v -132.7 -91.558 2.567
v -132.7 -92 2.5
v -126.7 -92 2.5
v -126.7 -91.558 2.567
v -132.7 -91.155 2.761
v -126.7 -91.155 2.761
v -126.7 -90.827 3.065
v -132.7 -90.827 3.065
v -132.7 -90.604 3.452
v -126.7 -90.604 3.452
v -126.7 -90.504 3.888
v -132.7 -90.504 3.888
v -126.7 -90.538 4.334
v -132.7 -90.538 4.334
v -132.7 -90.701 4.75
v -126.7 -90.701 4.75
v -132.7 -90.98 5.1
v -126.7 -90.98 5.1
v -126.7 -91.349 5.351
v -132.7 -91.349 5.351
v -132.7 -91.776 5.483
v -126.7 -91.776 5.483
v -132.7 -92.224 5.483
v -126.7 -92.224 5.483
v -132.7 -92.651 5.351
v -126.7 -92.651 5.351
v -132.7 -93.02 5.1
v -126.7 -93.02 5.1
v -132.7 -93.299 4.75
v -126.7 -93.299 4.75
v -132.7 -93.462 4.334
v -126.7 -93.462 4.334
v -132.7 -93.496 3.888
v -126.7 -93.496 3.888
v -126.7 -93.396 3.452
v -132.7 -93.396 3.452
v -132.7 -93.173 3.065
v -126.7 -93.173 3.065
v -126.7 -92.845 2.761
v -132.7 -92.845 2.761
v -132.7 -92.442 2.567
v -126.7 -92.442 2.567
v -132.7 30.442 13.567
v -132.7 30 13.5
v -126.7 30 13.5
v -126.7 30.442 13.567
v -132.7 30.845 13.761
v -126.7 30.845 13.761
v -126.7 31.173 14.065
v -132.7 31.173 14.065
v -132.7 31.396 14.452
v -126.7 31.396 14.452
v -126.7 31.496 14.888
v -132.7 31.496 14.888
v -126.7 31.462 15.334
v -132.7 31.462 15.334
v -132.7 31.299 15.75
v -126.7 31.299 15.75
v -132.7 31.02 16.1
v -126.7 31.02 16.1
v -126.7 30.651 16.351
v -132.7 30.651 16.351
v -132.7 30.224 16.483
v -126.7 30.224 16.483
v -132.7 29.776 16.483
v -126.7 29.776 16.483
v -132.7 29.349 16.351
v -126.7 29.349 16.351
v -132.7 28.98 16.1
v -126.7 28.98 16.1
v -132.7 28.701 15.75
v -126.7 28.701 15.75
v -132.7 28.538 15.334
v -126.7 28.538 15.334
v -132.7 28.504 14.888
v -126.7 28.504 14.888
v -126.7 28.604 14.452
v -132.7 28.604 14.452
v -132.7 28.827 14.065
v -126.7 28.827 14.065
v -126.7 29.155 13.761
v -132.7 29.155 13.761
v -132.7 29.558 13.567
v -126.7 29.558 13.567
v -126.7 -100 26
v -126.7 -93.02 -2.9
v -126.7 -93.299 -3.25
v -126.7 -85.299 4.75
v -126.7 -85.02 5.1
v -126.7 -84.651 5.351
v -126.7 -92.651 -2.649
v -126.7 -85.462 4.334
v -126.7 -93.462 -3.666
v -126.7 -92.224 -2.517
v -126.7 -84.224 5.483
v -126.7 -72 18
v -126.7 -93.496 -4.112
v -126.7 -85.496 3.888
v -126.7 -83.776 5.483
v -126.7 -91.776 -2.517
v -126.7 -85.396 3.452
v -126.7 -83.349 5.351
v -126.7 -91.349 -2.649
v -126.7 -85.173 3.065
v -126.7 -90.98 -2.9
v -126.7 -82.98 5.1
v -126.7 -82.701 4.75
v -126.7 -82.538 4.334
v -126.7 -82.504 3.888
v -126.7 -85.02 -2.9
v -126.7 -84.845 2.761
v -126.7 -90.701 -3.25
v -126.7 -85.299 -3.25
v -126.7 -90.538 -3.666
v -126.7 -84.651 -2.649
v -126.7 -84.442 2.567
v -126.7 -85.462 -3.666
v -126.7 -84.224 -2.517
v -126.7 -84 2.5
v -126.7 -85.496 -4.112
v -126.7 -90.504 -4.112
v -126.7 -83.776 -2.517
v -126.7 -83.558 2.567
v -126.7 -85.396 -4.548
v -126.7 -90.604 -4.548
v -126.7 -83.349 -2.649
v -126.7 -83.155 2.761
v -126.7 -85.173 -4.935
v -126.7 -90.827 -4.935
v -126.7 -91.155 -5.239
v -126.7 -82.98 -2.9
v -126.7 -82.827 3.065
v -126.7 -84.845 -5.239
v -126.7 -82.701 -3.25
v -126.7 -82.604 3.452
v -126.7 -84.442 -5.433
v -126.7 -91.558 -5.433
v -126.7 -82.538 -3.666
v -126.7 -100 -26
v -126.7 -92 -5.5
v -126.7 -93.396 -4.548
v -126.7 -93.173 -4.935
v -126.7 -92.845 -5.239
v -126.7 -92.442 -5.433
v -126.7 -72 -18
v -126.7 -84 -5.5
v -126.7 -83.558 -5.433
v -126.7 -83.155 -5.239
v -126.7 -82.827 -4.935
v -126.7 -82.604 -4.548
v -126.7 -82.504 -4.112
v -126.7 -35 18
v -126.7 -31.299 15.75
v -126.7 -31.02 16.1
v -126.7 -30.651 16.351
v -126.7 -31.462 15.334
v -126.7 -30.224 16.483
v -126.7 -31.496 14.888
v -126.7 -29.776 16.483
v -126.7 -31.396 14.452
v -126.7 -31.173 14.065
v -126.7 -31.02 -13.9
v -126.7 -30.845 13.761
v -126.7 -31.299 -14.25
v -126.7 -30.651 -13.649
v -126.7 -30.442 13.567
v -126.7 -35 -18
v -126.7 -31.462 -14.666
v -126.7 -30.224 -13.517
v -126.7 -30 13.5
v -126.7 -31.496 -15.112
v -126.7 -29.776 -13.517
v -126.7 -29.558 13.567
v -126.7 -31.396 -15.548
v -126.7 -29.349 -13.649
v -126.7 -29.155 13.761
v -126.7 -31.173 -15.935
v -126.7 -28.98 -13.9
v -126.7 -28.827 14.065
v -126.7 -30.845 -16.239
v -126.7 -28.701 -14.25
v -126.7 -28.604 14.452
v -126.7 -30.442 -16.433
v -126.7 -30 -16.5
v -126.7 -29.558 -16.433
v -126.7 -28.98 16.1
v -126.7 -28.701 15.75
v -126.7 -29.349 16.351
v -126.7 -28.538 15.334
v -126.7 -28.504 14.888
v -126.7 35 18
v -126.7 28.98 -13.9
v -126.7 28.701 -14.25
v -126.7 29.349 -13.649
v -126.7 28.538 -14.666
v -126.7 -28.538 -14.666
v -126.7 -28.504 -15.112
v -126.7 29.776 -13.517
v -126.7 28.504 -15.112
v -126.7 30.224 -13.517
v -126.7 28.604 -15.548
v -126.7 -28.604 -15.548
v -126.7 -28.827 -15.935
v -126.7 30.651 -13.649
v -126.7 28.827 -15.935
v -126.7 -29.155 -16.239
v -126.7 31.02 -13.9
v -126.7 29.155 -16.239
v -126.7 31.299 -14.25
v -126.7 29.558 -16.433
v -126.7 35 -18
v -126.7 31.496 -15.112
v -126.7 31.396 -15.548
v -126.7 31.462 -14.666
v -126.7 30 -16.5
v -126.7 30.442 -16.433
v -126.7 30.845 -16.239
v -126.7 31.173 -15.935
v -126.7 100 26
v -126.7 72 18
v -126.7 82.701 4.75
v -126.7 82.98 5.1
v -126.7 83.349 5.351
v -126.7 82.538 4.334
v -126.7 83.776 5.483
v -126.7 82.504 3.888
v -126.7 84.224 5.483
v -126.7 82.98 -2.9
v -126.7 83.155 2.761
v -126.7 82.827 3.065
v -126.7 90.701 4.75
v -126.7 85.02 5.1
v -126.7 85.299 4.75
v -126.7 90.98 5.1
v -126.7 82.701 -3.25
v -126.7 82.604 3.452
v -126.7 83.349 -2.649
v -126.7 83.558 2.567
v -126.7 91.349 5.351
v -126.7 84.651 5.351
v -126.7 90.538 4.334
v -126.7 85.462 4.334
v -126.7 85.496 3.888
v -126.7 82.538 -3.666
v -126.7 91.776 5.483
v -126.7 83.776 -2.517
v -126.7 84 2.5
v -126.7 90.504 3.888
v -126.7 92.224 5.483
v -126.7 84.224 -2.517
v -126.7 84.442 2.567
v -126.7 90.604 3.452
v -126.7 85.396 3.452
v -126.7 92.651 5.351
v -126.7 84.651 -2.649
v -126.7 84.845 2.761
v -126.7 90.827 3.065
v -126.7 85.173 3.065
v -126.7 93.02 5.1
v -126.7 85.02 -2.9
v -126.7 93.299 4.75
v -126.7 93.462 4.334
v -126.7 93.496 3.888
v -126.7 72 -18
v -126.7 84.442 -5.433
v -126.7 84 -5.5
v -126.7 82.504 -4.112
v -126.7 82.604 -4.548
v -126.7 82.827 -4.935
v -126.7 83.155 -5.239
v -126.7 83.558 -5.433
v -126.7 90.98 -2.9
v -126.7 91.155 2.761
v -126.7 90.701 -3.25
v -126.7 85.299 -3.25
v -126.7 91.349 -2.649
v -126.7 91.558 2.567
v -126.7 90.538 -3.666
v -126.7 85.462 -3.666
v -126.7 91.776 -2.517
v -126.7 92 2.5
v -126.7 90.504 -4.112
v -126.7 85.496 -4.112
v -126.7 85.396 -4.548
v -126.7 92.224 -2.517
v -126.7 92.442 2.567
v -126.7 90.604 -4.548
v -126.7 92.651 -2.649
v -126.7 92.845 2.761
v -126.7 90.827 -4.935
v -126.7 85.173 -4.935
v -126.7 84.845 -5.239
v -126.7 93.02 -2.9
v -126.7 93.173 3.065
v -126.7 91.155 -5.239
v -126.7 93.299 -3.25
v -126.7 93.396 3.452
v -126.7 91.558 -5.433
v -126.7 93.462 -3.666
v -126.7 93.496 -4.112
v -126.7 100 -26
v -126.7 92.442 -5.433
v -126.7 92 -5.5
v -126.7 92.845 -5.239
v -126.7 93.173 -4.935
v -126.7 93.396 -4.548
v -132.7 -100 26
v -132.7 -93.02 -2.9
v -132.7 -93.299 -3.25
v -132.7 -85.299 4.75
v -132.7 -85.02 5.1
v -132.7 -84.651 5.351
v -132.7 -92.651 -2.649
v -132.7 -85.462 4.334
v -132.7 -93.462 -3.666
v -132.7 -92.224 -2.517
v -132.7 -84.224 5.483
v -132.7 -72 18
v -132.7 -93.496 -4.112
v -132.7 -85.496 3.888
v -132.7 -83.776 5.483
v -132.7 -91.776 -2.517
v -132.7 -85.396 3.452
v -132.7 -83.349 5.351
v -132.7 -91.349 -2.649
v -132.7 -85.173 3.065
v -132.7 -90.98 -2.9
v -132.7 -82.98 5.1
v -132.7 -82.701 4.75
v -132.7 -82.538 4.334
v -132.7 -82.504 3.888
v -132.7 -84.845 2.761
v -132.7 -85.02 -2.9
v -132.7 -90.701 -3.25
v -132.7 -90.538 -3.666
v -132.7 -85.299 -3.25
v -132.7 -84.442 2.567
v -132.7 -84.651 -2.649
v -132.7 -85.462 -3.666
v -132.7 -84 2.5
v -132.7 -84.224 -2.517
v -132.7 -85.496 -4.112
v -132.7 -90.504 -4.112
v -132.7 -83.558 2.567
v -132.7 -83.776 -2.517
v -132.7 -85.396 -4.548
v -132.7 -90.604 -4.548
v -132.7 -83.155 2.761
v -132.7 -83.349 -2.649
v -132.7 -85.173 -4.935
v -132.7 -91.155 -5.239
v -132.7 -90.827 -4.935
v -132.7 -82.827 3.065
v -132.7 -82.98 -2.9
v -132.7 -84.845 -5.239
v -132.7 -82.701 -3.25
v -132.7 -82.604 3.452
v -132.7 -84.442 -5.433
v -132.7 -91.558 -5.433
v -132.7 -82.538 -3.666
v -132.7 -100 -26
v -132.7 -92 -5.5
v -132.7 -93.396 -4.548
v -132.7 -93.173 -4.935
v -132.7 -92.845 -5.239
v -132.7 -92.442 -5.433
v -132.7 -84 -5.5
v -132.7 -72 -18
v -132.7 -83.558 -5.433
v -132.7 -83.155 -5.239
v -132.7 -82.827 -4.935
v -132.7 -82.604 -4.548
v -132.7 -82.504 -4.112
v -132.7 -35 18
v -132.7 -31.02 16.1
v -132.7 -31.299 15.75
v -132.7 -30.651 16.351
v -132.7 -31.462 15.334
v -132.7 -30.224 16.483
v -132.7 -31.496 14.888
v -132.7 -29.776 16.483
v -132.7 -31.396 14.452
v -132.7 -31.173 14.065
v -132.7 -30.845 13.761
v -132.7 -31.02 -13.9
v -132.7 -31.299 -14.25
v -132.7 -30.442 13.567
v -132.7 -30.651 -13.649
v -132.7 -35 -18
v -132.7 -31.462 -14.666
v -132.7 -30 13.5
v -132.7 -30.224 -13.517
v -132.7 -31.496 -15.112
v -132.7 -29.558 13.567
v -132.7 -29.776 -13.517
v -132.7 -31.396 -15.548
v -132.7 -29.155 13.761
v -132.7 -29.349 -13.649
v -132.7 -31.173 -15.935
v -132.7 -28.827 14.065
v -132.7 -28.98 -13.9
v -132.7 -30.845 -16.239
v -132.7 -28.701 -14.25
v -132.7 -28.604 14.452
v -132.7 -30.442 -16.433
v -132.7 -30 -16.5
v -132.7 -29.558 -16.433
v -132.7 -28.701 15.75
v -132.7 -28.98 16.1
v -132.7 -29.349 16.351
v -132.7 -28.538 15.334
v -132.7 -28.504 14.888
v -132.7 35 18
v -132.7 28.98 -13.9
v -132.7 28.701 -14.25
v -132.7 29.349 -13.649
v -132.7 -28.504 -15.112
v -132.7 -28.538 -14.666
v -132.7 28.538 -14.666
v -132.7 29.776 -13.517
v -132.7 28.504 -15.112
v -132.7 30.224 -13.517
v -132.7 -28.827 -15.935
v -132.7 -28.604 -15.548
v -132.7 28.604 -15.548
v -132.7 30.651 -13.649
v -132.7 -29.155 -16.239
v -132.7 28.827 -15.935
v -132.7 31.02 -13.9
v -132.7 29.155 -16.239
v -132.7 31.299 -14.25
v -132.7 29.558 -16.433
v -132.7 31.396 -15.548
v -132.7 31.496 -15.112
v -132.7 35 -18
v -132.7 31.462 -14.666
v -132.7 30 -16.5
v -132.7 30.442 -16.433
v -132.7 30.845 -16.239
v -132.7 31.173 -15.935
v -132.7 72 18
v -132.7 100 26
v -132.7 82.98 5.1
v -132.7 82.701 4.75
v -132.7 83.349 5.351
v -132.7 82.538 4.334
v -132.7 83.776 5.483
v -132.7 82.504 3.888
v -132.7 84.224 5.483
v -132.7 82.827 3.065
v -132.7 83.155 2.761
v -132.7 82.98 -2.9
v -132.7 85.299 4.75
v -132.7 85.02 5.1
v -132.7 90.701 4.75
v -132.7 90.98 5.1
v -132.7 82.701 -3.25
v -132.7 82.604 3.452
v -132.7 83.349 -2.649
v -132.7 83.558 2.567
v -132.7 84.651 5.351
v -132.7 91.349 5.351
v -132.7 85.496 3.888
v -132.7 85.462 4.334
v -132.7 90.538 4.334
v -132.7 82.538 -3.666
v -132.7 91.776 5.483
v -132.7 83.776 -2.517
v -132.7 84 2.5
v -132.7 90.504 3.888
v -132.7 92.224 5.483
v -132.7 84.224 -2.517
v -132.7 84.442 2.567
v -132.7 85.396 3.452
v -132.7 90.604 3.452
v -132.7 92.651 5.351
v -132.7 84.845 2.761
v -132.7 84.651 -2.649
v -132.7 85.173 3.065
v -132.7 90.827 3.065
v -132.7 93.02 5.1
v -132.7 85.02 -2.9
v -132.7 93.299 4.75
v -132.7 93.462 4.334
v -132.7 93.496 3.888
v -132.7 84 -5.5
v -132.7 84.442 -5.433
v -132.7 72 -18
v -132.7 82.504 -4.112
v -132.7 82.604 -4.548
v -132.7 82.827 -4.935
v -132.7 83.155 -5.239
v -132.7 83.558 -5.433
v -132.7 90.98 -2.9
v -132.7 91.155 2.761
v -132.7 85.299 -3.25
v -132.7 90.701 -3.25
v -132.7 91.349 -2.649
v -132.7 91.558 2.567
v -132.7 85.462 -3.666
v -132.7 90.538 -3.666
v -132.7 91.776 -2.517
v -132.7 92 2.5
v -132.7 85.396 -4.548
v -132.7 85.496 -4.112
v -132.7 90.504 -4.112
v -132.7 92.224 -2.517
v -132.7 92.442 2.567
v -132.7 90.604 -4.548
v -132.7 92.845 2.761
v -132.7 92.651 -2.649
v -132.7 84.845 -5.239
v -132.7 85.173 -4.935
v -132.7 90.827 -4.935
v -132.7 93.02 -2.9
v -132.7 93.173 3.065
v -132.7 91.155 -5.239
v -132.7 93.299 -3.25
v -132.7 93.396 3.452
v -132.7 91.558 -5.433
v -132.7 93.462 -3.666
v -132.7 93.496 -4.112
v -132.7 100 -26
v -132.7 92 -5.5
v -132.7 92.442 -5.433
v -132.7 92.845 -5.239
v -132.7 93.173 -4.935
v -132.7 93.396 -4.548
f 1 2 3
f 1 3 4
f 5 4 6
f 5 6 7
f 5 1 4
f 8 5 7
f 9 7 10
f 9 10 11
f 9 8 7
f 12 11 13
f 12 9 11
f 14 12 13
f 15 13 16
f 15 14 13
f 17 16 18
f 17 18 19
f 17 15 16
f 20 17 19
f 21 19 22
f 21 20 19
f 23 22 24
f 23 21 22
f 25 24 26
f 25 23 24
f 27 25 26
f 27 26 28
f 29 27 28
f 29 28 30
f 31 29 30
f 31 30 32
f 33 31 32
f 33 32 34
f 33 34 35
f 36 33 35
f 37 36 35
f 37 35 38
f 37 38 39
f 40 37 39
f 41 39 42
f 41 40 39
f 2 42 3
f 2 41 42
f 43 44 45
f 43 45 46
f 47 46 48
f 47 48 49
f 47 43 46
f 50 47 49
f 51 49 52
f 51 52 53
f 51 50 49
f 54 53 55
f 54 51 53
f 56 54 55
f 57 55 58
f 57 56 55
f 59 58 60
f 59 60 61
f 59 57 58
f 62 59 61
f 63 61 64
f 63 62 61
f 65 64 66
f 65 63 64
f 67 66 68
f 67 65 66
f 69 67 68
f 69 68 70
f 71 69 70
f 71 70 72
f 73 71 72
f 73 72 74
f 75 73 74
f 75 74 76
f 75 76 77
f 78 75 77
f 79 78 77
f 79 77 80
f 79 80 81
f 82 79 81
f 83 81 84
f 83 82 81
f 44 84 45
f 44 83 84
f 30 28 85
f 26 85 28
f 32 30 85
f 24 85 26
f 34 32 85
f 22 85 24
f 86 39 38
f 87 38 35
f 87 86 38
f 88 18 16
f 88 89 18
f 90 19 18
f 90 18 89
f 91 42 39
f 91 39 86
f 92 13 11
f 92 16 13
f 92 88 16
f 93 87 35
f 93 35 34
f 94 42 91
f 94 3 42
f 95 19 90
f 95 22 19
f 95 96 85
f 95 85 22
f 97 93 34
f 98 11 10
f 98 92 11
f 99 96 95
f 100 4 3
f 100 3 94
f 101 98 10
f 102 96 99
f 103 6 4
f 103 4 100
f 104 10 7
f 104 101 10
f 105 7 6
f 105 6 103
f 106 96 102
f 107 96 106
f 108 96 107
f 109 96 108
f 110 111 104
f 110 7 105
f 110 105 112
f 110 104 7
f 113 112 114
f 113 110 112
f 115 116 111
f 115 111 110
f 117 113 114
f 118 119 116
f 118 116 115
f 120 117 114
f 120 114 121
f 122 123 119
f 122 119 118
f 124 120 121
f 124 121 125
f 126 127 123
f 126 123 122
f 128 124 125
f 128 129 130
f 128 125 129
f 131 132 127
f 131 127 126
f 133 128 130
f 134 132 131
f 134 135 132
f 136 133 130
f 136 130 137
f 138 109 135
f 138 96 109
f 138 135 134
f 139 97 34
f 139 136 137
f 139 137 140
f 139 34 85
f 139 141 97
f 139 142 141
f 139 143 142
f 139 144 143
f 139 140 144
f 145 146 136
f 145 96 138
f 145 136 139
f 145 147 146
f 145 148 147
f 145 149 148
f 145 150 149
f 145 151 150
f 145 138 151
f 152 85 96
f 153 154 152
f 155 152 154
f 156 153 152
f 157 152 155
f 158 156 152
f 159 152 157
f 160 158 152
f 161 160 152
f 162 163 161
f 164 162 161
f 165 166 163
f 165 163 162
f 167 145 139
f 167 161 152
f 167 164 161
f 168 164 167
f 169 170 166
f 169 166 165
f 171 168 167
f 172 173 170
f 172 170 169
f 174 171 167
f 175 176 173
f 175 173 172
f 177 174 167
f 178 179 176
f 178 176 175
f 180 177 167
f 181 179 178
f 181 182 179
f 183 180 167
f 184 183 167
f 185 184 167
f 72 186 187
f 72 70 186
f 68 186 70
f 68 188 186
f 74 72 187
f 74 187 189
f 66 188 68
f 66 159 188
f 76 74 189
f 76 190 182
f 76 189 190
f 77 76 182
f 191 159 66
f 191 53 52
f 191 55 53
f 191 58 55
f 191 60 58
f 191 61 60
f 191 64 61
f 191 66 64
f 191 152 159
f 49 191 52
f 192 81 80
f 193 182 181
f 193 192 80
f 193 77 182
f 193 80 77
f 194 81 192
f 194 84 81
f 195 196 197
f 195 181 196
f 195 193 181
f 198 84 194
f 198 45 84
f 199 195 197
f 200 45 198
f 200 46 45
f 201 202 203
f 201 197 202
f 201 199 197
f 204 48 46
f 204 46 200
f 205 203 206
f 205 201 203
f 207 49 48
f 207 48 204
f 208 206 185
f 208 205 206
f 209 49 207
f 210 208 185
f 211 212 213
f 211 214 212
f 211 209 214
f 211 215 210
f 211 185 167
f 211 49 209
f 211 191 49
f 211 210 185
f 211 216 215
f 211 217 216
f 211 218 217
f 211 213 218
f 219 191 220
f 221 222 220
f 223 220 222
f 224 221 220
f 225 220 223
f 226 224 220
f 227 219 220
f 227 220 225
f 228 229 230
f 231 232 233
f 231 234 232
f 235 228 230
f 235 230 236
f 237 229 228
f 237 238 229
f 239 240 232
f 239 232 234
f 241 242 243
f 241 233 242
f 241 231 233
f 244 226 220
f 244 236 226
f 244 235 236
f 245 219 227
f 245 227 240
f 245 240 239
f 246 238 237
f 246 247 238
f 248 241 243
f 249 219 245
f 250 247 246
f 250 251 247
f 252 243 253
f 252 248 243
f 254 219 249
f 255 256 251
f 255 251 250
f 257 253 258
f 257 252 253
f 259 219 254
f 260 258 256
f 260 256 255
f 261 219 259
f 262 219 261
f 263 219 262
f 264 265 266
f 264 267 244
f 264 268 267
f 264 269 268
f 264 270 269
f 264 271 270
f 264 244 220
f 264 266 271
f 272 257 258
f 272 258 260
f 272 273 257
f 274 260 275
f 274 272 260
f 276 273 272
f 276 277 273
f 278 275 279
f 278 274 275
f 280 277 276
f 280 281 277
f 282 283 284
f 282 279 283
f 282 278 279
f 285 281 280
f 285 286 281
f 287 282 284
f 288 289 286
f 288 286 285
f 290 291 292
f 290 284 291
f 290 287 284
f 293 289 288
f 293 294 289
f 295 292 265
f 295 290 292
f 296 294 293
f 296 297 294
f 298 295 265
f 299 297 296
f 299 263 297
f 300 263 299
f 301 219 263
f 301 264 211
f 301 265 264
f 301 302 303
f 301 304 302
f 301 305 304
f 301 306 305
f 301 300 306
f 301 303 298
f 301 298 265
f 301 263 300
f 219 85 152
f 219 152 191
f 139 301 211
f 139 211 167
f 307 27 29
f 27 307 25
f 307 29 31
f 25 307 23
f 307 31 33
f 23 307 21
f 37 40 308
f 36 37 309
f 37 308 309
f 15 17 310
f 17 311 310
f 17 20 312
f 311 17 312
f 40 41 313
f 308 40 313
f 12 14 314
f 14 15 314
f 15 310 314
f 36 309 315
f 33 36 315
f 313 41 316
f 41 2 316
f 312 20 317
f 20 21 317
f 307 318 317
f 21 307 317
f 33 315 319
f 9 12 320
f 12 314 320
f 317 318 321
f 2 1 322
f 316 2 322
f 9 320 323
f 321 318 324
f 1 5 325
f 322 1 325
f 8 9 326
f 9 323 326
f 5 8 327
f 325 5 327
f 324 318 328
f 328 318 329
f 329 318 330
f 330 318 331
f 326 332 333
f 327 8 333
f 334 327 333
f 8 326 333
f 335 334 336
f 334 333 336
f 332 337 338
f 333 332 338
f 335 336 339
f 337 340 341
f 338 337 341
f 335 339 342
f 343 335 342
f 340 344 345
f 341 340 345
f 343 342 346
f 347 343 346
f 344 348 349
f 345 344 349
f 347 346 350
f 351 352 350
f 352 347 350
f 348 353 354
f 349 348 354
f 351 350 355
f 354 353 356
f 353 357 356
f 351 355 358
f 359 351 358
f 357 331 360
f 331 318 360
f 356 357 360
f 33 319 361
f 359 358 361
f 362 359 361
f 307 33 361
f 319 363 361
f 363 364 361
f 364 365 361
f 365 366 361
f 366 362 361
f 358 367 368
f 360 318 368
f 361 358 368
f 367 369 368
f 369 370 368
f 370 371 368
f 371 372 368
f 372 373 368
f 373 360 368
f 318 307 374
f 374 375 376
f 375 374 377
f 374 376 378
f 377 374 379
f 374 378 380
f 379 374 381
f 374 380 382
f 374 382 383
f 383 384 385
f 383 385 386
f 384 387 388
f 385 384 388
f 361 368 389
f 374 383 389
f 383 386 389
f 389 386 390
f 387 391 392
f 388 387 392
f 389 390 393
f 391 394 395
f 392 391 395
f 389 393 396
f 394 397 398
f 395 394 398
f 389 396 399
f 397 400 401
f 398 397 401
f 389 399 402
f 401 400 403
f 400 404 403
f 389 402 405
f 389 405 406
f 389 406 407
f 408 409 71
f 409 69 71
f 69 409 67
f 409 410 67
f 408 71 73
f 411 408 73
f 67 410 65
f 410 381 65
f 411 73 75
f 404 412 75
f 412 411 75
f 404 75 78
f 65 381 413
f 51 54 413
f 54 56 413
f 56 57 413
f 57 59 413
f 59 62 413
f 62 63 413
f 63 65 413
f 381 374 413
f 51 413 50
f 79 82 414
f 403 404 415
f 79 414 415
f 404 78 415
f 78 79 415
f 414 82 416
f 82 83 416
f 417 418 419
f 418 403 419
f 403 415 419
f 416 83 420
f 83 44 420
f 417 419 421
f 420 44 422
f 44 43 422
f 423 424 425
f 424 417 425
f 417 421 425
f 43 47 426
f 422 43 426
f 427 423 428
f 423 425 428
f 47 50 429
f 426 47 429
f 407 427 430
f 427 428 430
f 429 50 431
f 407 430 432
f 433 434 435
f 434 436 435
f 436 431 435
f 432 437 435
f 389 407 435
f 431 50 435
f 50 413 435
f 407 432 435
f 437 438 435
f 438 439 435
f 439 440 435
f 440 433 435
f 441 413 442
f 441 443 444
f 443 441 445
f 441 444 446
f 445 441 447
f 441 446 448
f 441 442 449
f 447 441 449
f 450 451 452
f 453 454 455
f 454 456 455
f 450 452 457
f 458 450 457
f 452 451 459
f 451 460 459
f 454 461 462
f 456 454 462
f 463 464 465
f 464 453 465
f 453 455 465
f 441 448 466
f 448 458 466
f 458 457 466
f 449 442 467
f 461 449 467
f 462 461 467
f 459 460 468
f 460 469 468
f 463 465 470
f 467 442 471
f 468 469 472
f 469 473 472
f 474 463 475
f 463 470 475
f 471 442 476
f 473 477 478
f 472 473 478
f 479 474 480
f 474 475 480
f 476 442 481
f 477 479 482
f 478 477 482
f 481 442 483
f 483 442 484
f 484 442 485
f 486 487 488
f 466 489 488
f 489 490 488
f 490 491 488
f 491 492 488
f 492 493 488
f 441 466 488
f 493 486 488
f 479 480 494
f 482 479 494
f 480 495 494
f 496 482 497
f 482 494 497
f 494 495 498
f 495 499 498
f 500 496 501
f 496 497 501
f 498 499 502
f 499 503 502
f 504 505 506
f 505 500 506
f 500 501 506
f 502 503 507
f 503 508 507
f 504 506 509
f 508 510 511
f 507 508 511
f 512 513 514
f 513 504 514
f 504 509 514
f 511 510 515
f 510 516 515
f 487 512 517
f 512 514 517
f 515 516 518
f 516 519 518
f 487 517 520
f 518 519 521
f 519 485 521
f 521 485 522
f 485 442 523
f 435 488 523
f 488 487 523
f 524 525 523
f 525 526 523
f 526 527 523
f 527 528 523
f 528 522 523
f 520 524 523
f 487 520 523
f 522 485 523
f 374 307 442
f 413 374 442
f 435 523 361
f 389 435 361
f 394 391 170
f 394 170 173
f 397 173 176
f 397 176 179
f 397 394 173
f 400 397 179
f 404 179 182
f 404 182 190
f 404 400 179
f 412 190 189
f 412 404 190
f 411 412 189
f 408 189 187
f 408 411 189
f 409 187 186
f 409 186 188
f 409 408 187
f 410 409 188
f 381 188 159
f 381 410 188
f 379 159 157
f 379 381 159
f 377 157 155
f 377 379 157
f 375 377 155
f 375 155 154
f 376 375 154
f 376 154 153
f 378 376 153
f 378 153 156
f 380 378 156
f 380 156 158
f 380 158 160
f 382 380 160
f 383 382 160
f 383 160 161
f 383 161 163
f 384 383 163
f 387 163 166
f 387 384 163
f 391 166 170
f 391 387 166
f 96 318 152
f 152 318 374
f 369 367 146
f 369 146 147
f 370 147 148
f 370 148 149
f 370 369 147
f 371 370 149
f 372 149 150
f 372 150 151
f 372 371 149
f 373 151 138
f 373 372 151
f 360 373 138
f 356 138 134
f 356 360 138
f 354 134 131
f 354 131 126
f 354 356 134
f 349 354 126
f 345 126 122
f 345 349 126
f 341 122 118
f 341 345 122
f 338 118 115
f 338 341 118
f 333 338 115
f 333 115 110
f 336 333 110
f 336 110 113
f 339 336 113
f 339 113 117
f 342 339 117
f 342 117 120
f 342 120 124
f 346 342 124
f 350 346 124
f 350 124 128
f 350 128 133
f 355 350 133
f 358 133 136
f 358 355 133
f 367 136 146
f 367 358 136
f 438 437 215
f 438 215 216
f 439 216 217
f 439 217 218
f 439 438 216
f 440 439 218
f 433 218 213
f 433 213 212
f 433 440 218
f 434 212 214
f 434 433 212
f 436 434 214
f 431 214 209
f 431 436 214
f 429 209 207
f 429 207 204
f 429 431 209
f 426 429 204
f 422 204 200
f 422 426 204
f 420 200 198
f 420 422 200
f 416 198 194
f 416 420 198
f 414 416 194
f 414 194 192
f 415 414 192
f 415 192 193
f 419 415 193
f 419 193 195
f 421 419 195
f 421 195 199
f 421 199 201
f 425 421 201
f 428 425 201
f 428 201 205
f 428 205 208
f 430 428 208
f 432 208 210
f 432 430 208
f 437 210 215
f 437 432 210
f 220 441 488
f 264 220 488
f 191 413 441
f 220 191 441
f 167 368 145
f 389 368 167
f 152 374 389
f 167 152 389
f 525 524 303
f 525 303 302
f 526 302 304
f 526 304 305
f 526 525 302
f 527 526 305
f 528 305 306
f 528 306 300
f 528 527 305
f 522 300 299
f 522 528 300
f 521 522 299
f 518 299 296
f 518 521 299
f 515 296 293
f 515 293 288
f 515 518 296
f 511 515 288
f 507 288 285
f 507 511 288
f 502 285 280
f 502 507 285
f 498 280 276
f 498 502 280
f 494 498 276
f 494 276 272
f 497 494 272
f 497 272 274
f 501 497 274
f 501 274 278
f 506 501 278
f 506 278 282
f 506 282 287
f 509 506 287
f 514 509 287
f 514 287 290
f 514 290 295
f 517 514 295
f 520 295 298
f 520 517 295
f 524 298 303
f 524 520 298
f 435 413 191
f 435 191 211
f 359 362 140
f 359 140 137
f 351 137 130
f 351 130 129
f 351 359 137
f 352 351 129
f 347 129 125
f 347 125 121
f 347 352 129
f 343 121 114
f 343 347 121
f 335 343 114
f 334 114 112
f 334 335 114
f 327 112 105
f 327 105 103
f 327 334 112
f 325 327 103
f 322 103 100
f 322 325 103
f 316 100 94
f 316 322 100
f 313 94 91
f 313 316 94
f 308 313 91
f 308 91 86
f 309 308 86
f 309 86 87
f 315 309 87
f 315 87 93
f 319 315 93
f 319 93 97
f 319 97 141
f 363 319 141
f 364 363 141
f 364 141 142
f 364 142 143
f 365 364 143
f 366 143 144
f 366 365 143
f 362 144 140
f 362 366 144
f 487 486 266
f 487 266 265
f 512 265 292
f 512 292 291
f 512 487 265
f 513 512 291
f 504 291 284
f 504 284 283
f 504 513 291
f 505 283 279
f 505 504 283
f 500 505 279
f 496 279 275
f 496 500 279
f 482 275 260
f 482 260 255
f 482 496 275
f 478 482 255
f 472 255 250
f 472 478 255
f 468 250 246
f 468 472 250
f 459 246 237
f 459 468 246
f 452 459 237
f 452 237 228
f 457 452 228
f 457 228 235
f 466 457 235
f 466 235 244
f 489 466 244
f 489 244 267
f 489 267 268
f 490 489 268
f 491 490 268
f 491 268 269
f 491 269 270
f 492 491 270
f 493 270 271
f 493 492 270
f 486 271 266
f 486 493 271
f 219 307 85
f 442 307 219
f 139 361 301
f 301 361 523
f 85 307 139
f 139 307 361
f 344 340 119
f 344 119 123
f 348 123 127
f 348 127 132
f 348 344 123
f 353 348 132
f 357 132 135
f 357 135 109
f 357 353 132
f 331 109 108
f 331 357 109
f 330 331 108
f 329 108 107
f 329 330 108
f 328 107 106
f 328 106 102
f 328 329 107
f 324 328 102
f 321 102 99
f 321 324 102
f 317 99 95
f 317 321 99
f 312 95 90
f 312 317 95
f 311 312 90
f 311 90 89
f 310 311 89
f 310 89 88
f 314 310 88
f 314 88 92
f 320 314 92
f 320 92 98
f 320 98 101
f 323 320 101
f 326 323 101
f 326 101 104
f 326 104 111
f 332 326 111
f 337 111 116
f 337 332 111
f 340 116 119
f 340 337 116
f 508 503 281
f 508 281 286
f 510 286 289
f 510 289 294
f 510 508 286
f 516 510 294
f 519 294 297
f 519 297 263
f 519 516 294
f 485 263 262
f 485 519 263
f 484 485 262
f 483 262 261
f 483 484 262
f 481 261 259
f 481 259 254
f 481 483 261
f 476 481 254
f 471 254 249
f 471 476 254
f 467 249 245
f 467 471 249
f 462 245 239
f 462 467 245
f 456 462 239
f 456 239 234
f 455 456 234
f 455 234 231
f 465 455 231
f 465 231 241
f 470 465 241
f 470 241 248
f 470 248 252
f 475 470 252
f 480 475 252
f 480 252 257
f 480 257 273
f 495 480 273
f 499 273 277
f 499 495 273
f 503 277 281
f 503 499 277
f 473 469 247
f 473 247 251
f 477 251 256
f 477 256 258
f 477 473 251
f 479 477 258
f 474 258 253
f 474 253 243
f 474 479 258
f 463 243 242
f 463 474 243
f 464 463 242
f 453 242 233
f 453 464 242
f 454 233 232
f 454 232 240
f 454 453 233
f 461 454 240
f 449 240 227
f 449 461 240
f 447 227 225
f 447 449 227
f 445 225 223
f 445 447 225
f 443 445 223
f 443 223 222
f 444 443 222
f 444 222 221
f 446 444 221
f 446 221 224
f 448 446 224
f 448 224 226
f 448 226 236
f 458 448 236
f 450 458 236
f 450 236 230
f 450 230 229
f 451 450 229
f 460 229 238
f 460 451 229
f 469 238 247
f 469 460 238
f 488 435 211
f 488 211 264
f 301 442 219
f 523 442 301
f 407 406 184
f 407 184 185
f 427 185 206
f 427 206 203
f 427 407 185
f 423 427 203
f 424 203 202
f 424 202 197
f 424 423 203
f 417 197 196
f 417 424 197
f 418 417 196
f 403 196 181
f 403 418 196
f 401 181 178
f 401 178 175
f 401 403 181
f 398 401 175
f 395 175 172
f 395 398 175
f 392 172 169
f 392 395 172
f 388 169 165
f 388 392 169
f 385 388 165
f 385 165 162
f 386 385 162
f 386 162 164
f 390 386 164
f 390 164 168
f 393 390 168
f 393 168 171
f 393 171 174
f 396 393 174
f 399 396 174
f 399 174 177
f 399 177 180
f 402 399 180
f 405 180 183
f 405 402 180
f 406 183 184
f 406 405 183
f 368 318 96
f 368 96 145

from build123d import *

# Parameters (mm, degrees)
SKETCH1_W           = 52
SKETCH1_H           = 200
BOSS_EXTRUDE1_DEPTH = 6
SKETCH2_R           = 1.5
CUT_EXTRUDE2_DEPTH  = 6
SKETCH3_R           = 1.5
CUT_EXTRUDE4_DEPTH  = 6
SKETCH4_R           = 1.5
CUT_EXTRUDE6_DEPTH  = 6
SKETCH5_R           = 1.5
CUT_EXTRUDE8_DEPTH  = 6
SKETCH6_R           = 1.5
CUT_EXTRUDE10_DEPTH = 6
SKETCH7_R           = 1.5
CUT_EXTRUDE12_DEPTH = 6
SKETCH8_R           = 1.5
CUT_EXTRUDE14_DEPTH = 6
SKETCH9_R           = 1.5
CUT_EXTRUDE16_DEPTH = 6
SKETCH10_R          = 1.5
CUT_EXTRUDE18_DEPTH = 6
SKETCH11_R          = 1.5
CUT_EXTRUDE20_DEPTH = 6
SKETCH12_R          = 1.5
CUT_EXTRUDE22_DEPTH = 6
SKETCH13_R          = 1.5
CUT_EXTRUDE24_DEPTH = 6
SKETCH14_W          = 36
SKETCH14_H          = 37
CUT_EXTRUDE26_DEPTH = 6
SKETCH15_W          = 36
SKETCH15_H          = 37
CUT_EXTRUDE28_DEPTH = 6


with BuildPart() as part:
    # Sketch1 → Boss-Extrude1 (new body)
    with BuildSketch(Plane(origin=(-132.7, 0, 0), x_dir=(0, 0, -1), z_dir=(1, 0, 0))):
        Rectangle(SKETCH1_W, SKETCH1_H)
    extrude(amount=BOSS_EXTRUDE1_DEPTH)

    # Sketch2 → Cut-Extrude2 (cut)
    with BuildSketch(Plane(origin=(-132.7, 0, 0), x_dir=(0, 0, -1), z_dir=(1, 0, 0))):
        with Locations((-4, 84)):
            Circle(SKETCH2_R)
    extrude(amount=CUT_EXTRUDE2_DEPTH, mode=Mode.SUBTRACT)

    # Sketch3 → Cut-Extrude4 (cut)
    with BuildSketch(Plane(origin=(-132.7, 0, 0), x_dir=(0, 0, -1), z_dir=(1, 0, 0))):
        with Locations((4, 84)):
            Circle(SKETCH3_R)
    extrude(amount=CUT_EXTRUDE4_DEPTH, mode=Mode.SUBTRACT)

    # Sketch4 → Cut-Extrude6 (cut)
    with BuildSketch(Plane(origin=(-132.7, 0, 0), x_dir=(0, 0, -1), z_dir=(1, 0, 0))):
        with Locations((-4, 92)):
            Circle(SKETCH4_R)
    extrude(amount=CUT_EXTRUDE6_DEPTH, mode=Mode.SUBTRACT)

    # Sketch5 → Cut-Extrude8 (cut)
    with BuildSketch(Plane(origin=(-132.7, 0, 0), x_dir=(0, 0, -1), z_dir=(1, 0, 0))):
        with Locations((4, 92)):
            Circle(SKETCH5_R)
    extrude(amount=CUT_EXTRUDE8_DEPTH, mode=Mode.SUBTRACT)

    # Sketch6 → Cut-Extrude10 (cut)
    with BuildSketch(Plane(origin=(-132.7, 0, 0), x_dir=(0, 0, -1), z_dir=(1, 0, 0))):
        with Locations((-4, -92)):
            Circle(SKETCH6_R)
    extrude(amount=CUT_EXTRUDE10_DEPTH, mode=Mode.SUBTRACT)

    # Sketch7 → Cut-Extrude12 (cut)
    with BuildSketch(Plane(origin=(-132.7, 0, 0), x_dir=(0, 0, -1), z_dir=(1, 0, 0))):
        with Locations((4, -92)):
            Circle(SKETCH7_R)
    extrude(amount=CUT_EXTRUDE12_DEPTH, mode=Mode.SUBTRACT)

    # Sketch8 → Cut-Extrude14 (cut)
    with BuildSketch(Plane(origin=(-132.7, 0, 0), x_dir=(0, 0, -1), z_dir=(1, 0, 0))):
        with Locations((-4, -84)):
            Circle(SKETCH8_R)
    extrude(amount=CUT_EXTRUDE14_DEPTH, mode=Mode.SUBTRACT)

    # Sketch9 → Cut-Extrude16 (cut)
    with BuildSketch(Plane(origin=(-132.7, 0, 0), x_dir=(0, 0, -1), z_dir=(1, 0, 0))):
        with Locations((4, -84)):
            Circle(SKETCH9_R)
    extrude(amount=CUT_EXTRUDE16_DEPTH, mode=Mode.SUBTRACT)

    # Sketch10 → Cut-Extrude18 (cut)
    with BuildSketch(Plane(origin=(-132.7, 0, 0), x_dir=(0, 0, -1), z_dir=(1, 0, 0))):
        with Locations((-15, -30)):
            Circle(SKETCH10_R)
    extrude(amount=CUT_EXTRUDE18_DEPTH, mode=Mode.SUBTRACT)

    # Sketch11 → Cut-Extrude20 (cut)
    with BuildSketch(Plane(origin=(-132.7, 0, 0), x_dir=(0, 0, -1), z_dir=(1, 0, 0))):
        with Locations((15, -30)):
            Circle(SKETCH11_R)
    extrude(amount=CUT_EXTRUDE20_DEPTH, mode=Mode.SUBTRACT)

    # Sketch12 → Cut-Extrude22 (cut)
    with BuildSketch(Plane(origin=(-132.7, 0, 0), x_dir=(0, 0, -1), z_dir=(1, 0, 0))):
        with Locations((-15, 30)):
            Circle(SKETCH12_R)
    extrude(amount=CUT_EXTRUDE22_DEPTH, mode=Mode.SUBTRACT)

    # Sketch13 → Cut-Extrude24 (cut)
    with BuildSketch(Plane(origin=(-132.7, 0, 0), x_dir=(0, 0, -1), z_dir=(1, 0, 0))):
        with Locations((15, 30)):
            Circle(SKETCH13_R)
    extrude(amount=CUT_EXTRUDE24_DEPTH, mode=Mode.SUBTRACT)

    # Sketch14 → Cut-Extrude26 (cut)
    with BuildSketch(Plane(origin=(-132.7, 0, 0), x_dir=(0, 0, -1), z_dir=(1, 0, 0))):
        with Locations((0, 53.5)):
            Rectangle(SKETCH14_W, SKETCH14_H)
    extrude(amount=CUT_EXTRUDE26_DEPTH, mode=Mode.SUBTRACT)

    # Sketch15 → Cut-Extrude28 (cut)
    with BuildSketch(Plane(origin=(-132.7, 0, 0), x_dir=(0, 0, -1), z_dir=(1, 0, 0))):
        with Locations((0, -53.5)):
            Rectangle(SKETCH15_W, SKETCH15_H)
    extrude(amount=CUT_EXTRUDE28_DEPTH, mode=Mode.SUBTRACT)


solid = part.part
